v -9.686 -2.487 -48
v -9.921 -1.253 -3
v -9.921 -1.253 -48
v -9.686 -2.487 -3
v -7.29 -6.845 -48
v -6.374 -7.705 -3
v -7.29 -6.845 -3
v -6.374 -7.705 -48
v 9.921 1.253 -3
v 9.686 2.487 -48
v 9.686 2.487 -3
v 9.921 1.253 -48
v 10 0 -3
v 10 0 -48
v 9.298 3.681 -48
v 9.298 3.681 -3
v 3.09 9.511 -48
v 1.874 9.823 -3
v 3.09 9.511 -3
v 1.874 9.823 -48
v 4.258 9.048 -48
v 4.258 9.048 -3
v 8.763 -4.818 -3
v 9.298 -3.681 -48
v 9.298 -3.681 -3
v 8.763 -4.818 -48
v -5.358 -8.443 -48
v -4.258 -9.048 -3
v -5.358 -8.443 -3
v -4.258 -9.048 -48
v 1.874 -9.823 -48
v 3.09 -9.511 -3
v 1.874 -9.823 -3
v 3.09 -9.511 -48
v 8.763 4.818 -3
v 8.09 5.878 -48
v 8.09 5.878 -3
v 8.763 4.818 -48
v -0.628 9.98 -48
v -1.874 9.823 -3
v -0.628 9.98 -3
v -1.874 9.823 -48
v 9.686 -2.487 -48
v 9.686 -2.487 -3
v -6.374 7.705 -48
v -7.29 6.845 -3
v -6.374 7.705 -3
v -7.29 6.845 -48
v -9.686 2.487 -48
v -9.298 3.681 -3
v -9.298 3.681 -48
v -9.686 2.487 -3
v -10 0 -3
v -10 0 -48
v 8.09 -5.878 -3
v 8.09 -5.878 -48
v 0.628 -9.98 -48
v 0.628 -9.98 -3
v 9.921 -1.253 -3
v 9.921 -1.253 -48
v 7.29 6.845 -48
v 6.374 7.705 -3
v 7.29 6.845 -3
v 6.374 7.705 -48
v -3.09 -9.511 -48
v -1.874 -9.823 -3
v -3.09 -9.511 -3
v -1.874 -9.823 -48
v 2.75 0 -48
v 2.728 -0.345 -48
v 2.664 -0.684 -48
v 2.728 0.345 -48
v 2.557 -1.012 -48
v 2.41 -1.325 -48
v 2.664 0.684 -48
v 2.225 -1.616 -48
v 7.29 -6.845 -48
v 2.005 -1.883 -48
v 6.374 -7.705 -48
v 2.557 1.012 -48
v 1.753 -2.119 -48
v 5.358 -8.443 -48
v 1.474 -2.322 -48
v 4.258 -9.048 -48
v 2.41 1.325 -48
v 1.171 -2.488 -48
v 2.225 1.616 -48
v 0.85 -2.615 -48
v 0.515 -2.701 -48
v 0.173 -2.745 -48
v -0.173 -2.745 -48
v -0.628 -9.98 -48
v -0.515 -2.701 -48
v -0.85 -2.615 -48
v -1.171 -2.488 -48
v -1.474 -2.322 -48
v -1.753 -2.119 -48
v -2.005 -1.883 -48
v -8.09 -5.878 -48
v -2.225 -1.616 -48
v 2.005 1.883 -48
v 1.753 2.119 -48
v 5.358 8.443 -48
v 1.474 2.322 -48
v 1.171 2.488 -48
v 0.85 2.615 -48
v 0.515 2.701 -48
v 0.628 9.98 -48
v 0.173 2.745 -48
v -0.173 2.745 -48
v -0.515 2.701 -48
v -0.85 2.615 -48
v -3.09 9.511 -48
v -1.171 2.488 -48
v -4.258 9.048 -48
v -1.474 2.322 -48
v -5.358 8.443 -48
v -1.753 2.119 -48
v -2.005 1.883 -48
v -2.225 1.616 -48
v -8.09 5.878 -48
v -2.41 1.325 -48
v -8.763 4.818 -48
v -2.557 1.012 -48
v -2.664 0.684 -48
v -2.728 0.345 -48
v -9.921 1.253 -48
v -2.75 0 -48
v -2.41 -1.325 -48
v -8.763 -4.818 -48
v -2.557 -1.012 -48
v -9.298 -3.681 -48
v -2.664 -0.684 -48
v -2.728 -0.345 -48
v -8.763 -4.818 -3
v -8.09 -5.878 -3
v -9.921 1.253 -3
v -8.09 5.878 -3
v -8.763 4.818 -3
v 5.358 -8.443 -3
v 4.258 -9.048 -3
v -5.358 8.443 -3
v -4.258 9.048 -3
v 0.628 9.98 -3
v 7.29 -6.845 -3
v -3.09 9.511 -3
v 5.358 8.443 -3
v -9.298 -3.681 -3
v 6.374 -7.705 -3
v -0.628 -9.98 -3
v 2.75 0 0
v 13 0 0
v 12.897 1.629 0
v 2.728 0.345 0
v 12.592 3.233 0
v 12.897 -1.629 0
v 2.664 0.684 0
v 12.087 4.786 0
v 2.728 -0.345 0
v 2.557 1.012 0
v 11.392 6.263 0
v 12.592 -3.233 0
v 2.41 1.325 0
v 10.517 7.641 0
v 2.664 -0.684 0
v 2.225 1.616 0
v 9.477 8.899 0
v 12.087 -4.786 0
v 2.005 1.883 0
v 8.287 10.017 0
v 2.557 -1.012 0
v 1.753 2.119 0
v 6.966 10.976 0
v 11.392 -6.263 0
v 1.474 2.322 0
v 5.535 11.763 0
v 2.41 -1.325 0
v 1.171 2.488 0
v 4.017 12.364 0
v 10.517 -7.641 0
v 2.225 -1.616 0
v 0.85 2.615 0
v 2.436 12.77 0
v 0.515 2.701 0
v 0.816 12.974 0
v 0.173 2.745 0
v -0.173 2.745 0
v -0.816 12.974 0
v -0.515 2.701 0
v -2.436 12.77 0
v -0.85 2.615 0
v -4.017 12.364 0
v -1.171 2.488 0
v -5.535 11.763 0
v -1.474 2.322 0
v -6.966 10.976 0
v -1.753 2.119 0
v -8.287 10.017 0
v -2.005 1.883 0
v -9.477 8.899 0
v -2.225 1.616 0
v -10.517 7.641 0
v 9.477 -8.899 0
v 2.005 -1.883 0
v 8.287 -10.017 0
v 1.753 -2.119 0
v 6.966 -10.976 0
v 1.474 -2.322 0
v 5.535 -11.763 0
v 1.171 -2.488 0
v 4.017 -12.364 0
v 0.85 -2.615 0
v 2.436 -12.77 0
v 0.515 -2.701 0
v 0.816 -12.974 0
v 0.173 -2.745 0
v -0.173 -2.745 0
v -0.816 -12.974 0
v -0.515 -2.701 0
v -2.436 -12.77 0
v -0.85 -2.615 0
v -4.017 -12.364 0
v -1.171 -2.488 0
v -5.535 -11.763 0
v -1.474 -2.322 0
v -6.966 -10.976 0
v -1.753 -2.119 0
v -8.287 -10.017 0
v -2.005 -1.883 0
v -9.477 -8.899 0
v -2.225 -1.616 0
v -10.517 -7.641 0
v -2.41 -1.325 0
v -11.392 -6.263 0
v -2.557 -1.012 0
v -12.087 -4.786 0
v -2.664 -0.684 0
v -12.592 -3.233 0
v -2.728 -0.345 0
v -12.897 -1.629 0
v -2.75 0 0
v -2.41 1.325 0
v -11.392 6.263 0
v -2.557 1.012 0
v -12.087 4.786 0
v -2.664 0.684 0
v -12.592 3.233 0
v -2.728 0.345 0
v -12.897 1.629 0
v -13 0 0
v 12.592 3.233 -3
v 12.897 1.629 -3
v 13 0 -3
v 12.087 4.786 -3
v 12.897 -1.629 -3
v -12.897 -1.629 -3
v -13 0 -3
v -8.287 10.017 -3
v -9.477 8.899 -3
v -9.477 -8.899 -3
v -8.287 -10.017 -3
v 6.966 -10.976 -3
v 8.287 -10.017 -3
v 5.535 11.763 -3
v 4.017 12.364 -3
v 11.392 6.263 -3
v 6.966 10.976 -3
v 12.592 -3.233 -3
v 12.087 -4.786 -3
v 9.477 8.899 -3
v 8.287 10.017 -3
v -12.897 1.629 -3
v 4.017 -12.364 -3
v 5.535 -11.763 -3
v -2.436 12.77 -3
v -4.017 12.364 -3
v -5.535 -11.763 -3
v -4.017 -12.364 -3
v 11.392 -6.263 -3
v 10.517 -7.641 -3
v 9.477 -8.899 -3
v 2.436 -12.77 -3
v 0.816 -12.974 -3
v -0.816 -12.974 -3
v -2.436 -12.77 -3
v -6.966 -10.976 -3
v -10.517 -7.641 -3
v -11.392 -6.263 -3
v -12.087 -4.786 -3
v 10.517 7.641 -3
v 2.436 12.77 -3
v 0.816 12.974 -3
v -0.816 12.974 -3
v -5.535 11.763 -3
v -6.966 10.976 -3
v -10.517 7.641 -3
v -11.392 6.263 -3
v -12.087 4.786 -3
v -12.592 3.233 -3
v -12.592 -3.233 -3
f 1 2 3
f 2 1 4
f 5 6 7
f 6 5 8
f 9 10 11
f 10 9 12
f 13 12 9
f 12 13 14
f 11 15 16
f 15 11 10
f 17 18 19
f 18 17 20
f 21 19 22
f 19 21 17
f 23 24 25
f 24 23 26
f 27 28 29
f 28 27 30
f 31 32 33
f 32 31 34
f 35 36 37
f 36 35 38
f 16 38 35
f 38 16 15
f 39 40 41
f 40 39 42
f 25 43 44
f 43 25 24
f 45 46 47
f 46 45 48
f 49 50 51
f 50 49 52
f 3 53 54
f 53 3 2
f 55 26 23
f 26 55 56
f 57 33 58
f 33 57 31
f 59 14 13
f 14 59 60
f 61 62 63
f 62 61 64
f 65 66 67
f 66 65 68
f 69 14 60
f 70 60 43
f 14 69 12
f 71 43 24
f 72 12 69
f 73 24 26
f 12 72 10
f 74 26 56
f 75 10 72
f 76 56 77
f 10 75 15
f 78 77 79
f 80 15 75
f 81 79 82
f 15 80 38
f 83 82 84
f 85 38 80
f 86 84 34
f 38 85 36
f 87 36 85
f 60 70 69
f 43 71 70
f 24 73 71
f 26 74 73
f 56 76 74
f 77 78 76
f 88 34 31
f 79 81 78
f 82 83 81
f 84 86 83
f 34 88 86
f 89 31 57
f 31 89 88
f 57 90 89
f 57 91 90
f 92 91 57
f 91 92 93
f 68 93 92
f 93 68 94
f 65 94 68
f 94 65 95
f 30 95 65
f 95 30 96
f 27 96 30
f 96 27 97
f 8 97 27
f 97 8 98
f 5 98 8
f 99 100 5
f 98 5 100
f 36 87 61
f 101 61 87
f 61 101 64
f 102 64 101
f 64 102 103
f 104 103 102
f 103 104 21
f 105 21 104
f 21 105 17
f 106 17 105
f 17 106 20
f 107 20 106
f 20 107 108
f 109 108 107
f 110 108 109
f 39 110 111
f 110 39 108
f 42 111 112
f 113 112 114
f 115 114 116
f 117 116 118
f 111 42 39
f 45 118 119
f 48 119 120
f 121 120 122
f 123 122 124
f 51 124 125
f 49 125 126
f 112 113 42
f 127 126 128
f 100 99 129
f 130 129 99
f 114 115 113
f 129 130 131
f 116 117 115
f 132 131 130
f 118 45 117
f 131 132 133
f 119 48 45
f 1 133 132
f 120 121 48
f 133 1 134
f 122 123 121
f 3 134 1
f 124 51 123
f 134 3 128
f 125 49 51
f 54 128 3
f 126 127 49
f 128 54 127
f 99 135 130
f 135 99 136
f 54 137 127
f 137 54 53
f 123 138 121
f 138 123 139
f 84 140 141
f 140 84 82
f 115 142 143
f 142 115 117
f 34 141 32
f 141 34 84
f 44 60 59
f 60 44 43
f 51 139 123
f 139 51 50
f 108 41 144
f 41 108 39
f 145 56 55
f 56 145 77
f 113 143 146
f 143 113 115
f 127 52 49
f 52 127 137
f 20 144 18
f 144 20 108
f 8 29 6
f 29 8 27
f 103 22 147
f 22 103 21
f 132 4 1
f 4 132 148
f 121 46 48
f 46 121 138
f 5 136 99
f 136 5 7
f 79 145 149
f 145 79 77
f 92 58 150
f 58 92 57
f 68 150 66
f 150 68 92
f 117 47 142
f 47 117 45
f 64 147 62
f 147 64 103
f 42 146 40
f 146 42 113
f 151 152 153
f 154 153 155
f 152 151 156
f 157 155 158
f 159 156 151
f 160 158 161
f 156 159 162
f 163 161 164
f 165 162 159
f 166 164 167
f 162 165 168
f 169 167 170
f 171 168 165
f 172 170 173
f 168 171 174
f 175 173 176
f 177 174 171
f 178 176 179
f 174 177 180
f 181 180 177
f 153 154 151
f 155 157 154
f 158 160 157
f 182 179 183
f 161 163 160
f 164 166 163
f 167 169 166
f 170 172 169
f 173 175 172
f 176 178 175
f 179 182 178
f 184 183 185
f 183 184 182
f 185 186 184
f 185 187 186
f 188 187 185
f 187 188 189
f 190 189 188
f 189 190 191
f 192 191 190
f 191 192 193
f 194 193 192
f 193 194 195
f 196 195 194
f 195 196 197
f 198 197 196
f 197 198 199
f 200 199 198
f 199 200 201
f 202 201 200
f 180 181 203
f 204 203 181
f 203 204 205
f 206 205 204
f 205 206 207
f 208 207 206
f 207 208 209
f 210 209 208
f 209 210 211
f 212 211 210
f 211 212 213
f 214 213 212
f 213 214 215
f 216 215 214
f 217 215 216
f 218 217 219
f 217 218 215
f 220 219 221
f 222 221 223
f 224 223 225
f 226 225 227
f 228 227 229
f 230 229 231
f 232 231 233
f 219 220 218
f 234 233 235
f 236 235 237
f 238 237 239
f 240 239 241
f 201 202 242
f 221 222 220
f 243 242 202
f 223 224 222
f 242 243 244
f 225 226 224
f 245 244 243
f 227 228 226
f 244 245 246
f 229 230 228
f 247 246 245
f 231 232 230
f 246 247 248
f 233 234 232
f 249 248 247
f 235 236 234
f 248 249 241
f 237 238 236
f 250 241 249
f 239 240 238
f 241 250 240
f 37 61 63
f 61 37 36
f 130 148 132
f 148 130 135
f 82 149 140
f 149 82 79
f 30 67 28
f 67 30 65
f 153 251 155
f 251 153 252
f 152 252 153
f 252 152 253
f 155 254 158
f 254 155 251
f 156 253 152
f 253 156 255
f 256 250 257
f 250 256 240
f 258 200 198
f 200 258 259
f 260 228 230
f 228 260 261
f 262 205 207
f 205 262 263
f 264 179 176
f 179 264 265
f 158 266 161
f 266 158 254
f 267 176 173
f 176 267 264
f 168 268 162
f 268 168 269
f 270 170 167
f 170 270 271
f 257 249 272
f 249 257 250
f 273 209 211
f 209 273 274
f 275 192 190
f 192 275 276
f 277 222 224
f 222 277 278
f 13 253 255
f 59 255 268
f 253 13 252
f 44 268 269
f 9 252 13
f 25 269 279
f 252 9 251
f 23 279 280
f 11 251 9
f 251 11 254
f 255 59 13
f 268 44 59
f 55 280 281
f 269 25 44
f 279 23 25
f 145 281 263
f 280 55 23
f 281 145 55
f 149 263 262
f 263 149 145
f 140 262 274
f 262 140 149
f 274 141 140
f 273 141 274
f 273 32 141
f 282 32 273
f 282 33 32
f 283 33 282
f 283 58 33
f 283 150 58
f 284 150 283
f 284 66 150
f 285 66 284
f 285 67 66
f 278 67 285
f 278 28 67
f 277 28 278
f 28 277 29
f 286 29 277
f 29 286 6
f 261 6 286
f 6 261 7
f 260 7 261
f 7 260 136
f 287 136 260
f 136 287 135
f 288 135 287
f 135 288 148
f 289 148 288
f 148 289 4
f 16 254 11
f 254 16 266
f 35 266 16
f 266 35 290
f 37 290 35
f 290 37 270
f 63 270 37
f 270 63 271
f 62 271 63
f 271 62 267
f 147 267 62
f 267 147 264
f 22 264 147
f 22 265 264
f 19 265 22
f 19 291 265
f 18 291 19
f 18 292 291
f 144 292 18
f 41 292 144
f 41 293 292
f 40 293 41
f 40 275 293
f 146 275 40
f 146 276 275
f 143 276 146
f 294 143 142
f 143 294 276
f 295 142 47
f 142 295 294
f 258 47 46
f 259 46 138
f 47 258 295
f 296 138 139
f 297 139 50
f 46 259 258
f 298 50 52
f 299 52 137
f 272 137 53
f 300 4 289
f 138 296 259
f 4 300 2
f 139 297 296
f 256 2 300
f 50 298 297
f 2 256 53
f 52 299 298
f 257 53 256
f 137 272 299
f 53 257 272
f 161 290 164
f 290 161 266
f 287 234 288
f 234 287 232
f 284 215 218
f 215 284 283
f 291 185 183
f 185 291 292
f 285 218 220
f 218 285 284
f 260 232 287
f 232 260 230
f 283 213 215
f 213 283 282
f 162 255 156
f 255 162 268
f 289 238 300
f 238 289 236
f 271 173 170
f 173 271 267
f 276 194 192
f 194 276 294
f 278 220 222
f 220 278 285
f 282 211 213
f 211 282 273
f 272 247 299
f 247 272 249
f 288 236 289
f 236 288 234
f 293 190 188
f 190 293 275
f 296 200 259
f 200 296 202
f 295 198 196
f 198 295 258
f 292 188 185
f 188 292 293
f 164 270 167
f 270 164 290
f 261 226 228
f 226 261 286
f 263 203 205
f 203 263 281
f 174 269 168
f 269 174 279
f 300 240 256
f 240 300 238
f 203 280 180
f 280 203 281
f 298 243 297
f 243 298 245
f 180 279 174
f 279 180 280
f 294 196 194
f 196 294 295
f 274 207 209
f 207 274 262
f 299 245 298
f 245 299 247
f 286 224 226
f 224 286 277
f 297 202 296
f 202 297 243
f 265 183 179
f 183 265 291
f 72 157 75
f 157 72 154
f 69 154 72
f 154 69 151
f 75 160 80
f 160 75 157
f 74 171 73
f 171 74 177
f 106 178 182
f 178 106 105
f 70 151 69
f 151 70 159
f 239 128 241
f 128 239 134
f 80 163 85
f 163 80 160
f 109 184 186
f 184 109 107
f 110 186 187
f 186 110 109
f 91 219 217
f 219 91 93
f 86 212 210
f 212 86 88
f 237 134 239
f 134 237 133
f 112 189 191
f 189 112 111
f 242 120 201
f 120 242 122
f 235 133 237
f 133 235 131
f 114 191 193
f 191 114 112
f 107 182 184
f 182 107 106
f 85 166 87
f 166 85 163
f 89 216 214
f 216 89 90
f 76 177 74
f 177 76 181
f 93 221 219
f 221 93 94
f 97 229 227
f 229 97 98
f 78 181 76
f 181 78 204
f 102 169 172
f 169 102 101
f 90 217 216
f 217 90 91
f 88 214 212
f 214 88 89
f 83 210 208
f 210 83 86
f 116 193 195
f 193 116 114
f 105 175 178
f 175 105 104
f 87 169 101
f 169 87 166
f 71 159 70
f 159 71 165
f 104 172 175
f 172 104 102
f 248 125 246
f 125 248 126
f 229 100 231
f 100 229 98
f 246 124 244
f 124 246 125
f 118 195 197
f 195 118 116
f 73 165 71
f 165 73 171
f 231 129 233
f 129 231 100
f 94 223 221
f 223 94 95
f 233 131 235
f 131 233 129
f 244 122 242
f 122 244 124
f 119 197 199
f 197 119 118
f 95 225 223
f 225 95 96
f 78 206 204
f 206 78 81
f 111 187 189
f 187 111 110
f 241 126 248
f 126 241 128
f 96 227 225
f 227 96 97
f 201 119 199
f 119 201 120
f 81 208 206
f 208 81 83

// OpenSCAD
$fn = 50;


difference() {
	union() {
		translate(v = [0, 0, -48.0000000000]) {
			cylinder(h = 48, r = 10.0000000000);
		}
		translate(v = [0, 0, -3.0000000000]) {
			cylinder(h = 3, r = 13.0000000000);
		}
	}
	union() {
		#translate(v = [0, 0, -48]) {
			cylinder(h = 48, r = 2.7500000000);
		}
	}
}
